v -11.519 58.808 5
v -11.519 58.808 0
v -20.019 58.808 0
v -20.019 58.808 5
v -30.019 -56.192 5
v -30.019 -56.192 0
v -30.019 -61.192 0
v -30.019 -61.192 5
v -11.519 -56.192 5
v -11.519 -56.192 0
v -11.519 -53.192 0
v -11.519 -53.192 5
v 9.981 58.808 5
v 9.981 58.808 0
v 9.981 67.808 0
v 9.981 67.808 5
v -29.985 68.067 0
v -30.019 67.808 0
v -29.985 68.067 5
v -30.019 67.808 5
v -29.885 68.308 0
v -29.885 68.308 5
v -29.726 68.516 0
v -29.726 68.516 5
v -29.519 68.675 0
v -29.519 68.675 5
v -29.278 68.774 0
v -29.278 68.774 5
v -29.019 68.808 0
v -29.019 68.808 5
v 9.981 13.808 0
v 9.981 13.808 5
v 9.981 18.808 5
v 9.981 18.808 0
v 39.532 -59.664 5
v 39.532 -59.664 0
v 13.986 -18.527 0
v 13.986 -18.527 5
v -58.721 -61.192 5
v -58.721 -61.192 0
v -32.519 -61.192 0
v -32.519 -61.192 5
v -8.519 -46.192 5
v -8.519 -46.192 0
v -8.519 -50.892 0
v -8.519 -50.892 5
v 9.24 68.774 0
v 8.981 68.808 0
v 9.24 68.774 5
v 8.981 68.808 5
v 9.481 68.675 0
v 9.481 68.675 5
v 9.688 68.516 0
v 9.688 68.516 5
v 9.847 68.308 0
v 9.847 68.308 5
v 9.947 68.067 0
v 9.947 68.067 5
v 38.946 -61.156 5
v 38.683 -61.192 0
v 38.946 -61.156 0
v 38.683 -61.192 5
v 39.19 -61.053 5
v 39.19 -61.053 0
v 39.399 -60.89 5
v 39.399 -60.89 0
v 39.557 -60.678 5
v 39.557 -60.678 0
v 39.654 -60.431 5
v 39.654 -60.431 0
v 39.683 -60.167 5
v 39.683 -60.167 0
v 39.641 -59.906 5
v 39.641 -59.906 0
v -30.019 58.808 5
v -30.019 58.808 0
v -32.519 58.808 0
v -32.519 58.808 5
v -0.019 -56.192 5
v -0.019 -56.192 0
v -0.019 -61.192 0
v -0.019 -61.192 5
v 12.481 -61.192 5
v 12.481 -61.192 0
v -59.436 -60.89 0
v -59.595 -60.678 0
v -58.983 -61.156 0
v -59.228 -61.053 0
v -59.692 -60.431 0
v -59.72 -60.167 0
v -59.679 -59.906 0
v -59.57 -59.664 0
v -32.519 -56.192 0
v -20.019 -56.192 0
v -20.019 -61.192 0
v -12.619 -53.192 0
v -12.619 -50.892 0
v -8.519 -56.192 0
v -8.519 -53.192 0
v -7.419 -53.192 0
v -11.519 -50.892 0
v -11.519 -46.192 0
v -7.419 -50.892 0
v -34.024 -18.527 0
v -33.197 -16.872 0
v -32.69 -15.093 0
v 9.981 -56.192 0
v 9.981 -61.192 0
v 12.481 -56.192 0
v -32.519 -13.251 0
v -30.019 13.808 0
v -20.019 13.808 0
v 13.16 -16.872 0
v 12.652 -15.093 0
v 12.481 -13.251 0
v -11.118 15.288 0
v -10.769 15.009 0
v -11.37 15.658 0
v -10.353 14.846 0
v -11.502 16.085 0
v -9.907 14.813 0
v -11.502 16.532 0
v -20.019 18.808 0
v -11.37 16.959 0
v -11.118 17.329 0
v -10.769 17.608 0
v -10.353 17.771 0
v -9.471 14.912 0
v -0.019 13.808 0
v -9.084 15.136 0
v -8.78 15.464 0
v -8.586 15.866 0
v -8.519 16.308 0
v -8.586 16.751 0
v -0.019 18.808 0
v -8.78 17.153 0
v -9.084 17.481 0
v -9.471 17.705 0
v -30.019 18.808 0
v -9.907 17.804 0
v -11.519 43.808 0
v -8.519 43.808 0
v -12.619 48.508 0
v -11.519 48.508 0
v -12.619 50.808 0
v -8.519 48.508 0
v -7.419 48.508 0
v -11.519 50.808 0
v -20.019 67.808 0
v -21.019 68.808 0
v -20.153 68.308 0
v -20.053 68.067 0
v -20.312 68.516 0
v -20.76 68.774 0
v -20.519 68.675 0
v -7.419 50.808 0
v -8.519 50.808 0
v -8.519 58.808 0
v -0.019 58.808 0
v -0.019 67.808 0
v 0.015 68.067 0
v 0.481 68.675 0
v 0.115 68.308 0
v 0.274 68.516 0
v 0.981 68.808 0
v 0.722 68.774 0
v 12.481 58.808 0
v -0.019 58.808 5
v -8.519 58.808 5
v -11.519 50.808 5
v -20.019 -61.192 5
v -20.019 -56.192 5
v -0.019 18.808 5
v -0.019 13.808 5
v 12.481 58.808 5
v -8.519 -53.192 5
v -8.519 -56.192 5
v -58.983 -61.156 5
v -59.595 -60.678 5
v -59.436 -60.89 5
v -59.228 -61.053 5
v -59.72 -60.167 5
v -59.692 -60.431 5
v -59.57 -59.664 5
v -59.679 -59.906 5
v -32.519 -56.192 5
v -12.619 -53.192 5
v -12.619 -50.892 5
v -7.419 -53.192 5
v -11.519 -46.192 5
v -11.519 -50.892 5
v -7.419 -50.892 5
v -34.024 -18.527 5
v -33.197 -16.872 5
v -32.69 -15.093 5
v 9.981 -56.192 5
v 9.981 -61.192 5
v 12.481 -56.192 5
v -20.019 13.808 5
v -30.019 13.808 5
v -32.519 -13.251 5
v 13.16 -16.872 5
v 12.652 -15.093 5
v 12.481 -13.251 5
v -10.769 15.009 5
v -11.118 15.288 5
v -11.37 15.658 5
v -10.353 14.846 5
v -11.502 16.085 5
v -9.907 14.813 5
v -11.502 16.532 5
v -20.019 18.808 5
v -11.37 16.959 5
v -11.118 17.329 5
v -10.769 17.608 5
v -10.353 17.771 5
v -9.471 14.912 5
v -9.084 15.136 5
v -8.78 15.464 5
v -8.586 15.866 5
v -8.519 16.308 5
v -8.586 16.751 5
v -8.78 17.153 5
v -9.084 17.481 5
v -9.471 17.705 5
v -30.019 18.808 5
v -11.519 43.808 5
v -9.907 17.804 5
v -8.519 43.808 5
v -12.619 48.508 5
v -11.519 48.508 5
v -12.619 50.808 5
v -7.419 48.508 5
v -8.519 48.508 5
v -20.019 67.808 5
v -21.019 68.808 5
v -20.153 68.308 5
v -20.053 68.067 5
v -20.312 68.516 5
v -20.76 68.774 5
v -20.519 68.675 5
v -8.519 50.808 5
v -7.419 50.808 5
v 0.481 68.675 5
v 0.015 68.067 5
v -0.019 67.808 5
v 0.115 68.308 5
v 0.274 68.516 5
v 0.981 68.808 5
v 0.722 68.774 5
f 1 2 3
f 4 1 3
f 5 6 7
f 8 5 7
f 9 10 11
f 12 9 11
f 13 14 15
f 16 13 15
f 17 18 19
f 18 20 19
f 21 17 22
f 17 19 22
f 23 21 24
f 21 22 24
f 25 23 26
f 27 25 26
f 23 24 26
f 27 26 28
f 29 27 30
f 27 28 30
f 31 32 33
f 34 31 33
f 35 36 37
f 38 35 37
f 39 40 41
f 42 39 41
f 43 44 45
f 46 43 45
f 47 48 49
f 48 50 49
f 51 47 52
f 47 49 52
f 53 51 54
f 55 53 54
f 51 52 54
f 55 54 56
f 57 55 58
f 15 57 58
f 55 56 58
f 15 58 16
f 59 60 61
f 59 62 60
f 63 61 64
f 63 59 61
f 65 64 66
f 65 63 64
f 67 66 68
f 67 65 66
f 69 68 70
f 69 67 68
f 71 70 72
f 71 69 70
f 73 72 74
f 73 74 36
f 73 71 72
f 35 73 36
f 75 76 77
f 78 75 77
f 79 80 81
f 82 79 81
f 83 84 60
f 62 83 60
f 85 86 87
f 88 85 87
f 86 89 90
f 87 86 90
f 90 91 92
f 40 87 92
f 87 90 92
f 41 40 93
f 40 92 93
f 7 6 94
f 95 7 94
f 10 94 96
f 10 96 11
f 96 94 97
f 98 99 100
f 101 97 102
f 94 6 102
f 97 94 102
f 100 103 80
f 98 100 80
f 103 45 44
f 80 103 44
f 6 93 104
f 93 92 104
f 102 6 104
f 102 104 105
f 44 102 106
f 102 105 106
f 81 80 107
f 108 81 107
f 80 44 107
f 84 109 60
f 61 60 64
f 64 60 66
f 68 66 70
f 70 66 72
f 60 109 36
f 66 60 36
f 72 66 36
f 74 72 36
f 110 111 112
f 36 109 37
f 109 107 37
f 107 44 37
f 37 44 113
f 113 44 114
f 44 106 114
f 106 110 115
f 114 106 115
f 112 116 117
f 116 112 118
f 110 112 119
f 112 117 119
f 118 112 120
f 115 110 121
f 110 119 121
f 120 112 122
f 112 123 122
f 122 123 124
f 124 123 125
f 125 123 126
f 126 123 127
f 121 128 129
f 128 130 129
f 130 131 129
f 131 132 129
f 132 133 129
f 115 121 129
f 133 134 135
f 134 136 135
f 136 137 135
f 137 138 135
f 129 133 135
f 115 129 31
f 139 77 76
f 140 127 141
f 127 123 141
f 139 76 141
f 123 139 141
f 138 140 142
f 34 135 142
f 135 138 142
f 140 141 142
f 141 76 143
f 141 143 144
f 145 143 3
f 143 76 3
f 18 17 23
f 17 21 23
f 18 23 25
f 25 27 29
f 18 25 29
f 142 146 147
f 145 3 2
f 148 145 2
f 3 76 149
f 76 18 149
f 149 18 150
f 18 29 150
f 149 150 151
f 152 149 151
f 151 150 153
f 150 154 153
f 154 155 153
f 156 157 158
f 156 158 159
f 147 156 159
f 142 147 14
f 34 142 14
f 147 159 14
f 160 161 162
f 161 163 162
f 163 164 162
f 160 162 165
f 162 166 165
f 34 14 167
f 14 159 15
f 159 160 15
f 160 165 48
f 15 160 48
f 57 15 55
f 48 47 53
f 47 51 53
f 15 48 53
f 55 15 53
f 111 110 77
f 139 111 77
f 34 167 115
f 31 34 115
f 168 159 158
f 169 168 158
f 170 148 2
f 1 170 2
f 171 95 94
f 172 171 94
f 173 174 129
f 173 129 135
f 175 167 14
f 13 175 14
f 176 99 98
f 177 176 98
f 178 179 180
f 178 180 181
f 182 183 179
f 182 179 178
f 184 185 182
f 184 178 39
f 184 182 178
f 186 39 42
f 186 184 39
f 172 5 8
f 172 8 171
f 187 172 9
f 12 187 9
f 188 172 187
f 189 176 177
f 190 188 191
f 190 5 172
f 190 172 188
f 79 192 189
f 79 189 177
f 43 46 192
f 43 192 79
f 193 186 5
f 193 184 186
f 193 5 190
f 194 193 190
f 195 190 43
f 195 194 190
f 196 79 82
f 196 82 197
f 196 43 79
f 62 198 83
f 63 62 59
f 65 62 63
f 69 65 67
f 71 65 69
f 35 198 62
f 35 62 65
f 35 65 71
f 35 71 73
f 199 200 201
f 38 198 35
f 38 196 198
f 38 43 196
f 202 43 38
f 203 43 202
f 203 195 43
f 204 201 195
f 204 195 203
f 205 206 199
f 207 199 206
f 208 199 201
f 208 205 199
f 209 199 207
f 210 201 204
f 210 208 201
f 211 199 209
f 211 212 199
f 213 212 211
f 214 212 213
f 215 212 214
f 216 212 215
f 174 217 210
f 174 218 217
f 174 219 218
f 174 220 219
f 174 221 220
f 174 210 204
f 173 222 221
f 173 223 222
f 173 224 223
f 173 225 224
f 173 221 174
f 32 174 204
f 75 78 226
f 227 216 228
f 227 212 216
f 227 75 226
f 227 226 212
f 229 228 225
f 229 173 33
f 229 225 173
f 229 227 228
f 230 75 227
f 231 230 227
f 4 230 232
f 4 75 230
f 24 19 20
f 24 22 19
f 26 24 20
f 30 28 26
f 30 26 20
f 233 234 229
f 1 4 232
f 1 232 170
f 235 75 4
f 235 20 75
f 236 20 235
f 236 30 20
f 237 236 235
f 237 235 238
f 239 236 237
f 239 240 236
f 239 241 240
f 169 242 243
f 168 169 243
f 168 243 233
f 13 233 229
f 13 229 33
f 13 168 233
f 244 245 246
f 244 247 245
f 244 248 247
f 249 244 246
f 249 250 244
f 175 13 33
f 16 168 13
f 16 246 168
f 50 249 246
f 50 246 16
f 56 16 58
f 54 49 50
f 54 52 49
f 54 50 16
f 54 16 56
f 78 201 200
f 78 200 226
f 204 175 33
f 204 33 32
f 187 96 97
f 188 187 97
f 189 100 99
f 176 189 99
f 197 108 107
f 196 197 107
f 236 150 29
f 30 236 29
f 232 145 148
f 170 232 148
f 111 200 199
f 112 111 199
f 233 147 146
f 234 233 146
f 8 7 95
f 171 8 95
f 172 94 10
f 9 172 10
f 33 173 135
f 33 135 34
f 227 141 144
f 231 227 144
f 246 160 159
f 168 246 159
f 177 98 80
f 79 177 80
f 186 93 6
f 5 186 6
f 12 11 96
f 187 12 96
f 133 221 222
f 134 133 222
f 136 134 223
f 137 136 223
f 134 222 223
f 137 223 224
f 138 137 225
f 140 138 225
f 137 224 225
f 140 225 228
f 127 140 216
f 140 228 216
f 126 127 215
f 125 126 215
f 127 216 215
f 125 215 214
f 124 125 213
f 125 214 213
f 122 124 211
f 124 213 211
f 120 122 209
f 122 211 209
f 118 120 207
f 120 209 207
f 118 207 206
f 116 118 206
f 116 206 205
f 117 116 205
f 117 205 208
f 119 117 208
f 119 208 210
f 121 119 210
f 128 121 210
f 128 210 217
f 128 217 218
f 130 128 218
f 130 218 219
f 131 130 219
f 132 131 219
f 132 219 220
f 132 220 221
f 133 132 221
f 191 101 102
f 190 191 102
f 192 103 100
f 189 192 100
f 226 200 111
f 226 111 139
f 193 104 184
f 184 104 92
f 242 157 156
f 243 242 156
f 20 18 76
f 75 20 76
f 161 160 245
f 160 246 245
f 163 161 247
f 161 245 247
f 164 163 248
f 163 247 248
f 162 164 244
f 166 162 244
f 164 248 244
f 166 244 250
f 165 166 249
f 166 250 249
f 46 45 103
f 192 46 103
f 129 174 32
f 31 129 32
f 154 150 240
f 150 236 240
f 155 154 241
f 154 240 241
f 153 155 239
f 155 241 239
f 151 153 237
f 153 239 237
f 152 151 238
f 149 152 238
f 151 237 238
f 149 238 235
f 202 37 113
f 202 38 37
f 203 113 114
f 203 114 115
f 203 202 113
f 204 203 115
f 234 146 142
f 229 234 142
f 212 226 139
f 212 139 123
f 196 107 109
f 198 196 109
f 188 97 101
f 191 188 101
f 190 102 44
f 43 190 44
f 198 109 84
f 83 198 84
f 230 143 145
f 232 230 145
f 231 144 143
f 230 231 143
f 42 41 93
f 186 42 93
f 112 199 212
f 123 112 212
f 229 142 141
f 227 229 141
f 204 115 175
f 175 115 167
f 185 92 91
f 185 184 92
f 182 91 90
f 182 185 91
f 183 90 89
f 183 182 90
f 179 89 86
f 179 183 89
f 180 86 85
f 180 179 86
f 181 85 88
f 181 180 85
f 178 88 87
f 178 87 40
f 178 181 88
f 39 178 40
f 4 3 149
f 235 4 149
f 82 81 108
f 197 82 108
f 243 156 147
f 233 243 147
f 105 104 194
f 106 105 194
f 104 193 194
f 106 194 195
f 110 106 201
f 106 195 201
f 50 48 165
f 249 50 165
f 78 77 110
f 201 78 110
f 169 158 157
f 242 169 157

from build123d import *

# Parameters (mm, degrees)
BOSS_EXTRUDE1_DEPTH = 5
SKETCH2_R           = 1.5
SKETCH2_W           = 10
SKETCH2_H           = 5
CUT_EXTRUDE1_DEPTH  = 10
FILLET1_R           = 10
FILLET2_R           = 1
CONG_1_R            = 1


with BuildPart() as part:
    # Sketch1 → Boss-Extrude1 (new body)
    with BuildSketch(Plane.XY):
        Polygon((-32.518889855, -56.191512275), (-30.018889855, -56.191512275), (-30.018889855, -61.191512275), (-20.018889855, -61.191512275), (-20.018889855, -56.191512275), (-11.518889855, -56.191512275), (-11.518889855, -53.191512275), (-12.618889855, -53.191512275), (-12.618889855, -50.891512275), (-11.518889855, -50.891512275), (-11.518889855, -46.191512275), (-8.518889855, -46.191512275), (-8.518889855, -50.891512275), (-7.418889855, -50.891512275), (-7.418889855, -53.191512275), (-8.518889855, -53.191512275), (-8.518889855, -56.191512275), (-0.018889855, -56.191512275), (-0.018889855, -61.191512275), (9.981110145, -61.191512275), (9.981110145, -56.191512275), (12.481110145, -56.191512275), (12.481110145, -61.191512275), (40.481110145, -61.191512275), (12.481110145, -16.103821473), (12.481110145, 58.808487725), (9.981110145, 58.808487725), (9.981110145, 68.808487725), (-0.018889855, 68.808487725), (-0.018889855, 58.808487725), (-8.518889855, 58.808487725), (-8.518889855, 50.808487725), (-7.418889855, 50.808487725), (-7.418889855, 48.508487725), (-8.518889855, 48.508487725), (-8.518889855, 43.808487725), (-11.518889855, 43.808487725), (-11.518889855, 48.508487725), (-12.618889855, 48.508487725), (-12.618889855, 50.808487725), (-11.518889855, 50.808487725), (-11.518889855, 58.808487725), (-20.018889855, 58.808487725), (-20.018889855, 68.808487725), (-30.018889855, 68.808487725), (-30.018889855, 58.808487725), (-32.518889855, 58.808487725), (-32.518889855, -16.103821473), (-60.518889855, -61.191512275), (-32.518889855, -61.191512275), align=None)
    extrude(amount=BOSS_EXTRUDE1_DEPTH)

    # Sketch2 → Cut-Extrude1 (cut)
    with BuildSketch(Plane.XY.offset(5)):
        with Locations((-10.018889855, 16.308487725)):
            Circle(SKETCH2_R)
        with Locations((-25.018889855, 16.308487725)):
            Rectangle(SKETCH2_W, SKETCH2_H)
        with Locations((4.981110145, 16.308487725)):
            Rectangle(SKETCH2_W, SKETCH2_H)
    extrude(amount=-CUT_EXTRUDE1_DEPTH, mode=Mode.SUBTRACT)

    # Fillet1
    fillet1_edges = [part.edges().sort_by_distance(p)[0] for p in [
        (-32.518889855, -16.103821473, 2.5),
        (12.481110145, -16.103821473, 2.5),
    ]]
    fillet(fillet1_edges, radius=FILLET1_R)

    # Fillet2
    fillet2_edges = [part.edges().sort_by_distance(p)[0] for p in [
        (40.481110145, -61.191512275, 2.5),
        (-60.518889855, -61.191512275, 2.5),
    ]]
    fillet(fillet2_edges, radius=FILLET2_R)

    # Congé1
    cong_1_edges = [part.edges().sort_by_distance(p)[0] for p in [
        (-30.018889855, 68.808487725, 2.5),
        (-20.018889855, 68.808487725, 2.5),
        (-0.018889855, 68.808487725, 2.5),
        (9.981110145, 68.808487725, 2.5),
    ]]
    fillet(cong_1_edges, radius=CONG_1_R)


solid = part.part
